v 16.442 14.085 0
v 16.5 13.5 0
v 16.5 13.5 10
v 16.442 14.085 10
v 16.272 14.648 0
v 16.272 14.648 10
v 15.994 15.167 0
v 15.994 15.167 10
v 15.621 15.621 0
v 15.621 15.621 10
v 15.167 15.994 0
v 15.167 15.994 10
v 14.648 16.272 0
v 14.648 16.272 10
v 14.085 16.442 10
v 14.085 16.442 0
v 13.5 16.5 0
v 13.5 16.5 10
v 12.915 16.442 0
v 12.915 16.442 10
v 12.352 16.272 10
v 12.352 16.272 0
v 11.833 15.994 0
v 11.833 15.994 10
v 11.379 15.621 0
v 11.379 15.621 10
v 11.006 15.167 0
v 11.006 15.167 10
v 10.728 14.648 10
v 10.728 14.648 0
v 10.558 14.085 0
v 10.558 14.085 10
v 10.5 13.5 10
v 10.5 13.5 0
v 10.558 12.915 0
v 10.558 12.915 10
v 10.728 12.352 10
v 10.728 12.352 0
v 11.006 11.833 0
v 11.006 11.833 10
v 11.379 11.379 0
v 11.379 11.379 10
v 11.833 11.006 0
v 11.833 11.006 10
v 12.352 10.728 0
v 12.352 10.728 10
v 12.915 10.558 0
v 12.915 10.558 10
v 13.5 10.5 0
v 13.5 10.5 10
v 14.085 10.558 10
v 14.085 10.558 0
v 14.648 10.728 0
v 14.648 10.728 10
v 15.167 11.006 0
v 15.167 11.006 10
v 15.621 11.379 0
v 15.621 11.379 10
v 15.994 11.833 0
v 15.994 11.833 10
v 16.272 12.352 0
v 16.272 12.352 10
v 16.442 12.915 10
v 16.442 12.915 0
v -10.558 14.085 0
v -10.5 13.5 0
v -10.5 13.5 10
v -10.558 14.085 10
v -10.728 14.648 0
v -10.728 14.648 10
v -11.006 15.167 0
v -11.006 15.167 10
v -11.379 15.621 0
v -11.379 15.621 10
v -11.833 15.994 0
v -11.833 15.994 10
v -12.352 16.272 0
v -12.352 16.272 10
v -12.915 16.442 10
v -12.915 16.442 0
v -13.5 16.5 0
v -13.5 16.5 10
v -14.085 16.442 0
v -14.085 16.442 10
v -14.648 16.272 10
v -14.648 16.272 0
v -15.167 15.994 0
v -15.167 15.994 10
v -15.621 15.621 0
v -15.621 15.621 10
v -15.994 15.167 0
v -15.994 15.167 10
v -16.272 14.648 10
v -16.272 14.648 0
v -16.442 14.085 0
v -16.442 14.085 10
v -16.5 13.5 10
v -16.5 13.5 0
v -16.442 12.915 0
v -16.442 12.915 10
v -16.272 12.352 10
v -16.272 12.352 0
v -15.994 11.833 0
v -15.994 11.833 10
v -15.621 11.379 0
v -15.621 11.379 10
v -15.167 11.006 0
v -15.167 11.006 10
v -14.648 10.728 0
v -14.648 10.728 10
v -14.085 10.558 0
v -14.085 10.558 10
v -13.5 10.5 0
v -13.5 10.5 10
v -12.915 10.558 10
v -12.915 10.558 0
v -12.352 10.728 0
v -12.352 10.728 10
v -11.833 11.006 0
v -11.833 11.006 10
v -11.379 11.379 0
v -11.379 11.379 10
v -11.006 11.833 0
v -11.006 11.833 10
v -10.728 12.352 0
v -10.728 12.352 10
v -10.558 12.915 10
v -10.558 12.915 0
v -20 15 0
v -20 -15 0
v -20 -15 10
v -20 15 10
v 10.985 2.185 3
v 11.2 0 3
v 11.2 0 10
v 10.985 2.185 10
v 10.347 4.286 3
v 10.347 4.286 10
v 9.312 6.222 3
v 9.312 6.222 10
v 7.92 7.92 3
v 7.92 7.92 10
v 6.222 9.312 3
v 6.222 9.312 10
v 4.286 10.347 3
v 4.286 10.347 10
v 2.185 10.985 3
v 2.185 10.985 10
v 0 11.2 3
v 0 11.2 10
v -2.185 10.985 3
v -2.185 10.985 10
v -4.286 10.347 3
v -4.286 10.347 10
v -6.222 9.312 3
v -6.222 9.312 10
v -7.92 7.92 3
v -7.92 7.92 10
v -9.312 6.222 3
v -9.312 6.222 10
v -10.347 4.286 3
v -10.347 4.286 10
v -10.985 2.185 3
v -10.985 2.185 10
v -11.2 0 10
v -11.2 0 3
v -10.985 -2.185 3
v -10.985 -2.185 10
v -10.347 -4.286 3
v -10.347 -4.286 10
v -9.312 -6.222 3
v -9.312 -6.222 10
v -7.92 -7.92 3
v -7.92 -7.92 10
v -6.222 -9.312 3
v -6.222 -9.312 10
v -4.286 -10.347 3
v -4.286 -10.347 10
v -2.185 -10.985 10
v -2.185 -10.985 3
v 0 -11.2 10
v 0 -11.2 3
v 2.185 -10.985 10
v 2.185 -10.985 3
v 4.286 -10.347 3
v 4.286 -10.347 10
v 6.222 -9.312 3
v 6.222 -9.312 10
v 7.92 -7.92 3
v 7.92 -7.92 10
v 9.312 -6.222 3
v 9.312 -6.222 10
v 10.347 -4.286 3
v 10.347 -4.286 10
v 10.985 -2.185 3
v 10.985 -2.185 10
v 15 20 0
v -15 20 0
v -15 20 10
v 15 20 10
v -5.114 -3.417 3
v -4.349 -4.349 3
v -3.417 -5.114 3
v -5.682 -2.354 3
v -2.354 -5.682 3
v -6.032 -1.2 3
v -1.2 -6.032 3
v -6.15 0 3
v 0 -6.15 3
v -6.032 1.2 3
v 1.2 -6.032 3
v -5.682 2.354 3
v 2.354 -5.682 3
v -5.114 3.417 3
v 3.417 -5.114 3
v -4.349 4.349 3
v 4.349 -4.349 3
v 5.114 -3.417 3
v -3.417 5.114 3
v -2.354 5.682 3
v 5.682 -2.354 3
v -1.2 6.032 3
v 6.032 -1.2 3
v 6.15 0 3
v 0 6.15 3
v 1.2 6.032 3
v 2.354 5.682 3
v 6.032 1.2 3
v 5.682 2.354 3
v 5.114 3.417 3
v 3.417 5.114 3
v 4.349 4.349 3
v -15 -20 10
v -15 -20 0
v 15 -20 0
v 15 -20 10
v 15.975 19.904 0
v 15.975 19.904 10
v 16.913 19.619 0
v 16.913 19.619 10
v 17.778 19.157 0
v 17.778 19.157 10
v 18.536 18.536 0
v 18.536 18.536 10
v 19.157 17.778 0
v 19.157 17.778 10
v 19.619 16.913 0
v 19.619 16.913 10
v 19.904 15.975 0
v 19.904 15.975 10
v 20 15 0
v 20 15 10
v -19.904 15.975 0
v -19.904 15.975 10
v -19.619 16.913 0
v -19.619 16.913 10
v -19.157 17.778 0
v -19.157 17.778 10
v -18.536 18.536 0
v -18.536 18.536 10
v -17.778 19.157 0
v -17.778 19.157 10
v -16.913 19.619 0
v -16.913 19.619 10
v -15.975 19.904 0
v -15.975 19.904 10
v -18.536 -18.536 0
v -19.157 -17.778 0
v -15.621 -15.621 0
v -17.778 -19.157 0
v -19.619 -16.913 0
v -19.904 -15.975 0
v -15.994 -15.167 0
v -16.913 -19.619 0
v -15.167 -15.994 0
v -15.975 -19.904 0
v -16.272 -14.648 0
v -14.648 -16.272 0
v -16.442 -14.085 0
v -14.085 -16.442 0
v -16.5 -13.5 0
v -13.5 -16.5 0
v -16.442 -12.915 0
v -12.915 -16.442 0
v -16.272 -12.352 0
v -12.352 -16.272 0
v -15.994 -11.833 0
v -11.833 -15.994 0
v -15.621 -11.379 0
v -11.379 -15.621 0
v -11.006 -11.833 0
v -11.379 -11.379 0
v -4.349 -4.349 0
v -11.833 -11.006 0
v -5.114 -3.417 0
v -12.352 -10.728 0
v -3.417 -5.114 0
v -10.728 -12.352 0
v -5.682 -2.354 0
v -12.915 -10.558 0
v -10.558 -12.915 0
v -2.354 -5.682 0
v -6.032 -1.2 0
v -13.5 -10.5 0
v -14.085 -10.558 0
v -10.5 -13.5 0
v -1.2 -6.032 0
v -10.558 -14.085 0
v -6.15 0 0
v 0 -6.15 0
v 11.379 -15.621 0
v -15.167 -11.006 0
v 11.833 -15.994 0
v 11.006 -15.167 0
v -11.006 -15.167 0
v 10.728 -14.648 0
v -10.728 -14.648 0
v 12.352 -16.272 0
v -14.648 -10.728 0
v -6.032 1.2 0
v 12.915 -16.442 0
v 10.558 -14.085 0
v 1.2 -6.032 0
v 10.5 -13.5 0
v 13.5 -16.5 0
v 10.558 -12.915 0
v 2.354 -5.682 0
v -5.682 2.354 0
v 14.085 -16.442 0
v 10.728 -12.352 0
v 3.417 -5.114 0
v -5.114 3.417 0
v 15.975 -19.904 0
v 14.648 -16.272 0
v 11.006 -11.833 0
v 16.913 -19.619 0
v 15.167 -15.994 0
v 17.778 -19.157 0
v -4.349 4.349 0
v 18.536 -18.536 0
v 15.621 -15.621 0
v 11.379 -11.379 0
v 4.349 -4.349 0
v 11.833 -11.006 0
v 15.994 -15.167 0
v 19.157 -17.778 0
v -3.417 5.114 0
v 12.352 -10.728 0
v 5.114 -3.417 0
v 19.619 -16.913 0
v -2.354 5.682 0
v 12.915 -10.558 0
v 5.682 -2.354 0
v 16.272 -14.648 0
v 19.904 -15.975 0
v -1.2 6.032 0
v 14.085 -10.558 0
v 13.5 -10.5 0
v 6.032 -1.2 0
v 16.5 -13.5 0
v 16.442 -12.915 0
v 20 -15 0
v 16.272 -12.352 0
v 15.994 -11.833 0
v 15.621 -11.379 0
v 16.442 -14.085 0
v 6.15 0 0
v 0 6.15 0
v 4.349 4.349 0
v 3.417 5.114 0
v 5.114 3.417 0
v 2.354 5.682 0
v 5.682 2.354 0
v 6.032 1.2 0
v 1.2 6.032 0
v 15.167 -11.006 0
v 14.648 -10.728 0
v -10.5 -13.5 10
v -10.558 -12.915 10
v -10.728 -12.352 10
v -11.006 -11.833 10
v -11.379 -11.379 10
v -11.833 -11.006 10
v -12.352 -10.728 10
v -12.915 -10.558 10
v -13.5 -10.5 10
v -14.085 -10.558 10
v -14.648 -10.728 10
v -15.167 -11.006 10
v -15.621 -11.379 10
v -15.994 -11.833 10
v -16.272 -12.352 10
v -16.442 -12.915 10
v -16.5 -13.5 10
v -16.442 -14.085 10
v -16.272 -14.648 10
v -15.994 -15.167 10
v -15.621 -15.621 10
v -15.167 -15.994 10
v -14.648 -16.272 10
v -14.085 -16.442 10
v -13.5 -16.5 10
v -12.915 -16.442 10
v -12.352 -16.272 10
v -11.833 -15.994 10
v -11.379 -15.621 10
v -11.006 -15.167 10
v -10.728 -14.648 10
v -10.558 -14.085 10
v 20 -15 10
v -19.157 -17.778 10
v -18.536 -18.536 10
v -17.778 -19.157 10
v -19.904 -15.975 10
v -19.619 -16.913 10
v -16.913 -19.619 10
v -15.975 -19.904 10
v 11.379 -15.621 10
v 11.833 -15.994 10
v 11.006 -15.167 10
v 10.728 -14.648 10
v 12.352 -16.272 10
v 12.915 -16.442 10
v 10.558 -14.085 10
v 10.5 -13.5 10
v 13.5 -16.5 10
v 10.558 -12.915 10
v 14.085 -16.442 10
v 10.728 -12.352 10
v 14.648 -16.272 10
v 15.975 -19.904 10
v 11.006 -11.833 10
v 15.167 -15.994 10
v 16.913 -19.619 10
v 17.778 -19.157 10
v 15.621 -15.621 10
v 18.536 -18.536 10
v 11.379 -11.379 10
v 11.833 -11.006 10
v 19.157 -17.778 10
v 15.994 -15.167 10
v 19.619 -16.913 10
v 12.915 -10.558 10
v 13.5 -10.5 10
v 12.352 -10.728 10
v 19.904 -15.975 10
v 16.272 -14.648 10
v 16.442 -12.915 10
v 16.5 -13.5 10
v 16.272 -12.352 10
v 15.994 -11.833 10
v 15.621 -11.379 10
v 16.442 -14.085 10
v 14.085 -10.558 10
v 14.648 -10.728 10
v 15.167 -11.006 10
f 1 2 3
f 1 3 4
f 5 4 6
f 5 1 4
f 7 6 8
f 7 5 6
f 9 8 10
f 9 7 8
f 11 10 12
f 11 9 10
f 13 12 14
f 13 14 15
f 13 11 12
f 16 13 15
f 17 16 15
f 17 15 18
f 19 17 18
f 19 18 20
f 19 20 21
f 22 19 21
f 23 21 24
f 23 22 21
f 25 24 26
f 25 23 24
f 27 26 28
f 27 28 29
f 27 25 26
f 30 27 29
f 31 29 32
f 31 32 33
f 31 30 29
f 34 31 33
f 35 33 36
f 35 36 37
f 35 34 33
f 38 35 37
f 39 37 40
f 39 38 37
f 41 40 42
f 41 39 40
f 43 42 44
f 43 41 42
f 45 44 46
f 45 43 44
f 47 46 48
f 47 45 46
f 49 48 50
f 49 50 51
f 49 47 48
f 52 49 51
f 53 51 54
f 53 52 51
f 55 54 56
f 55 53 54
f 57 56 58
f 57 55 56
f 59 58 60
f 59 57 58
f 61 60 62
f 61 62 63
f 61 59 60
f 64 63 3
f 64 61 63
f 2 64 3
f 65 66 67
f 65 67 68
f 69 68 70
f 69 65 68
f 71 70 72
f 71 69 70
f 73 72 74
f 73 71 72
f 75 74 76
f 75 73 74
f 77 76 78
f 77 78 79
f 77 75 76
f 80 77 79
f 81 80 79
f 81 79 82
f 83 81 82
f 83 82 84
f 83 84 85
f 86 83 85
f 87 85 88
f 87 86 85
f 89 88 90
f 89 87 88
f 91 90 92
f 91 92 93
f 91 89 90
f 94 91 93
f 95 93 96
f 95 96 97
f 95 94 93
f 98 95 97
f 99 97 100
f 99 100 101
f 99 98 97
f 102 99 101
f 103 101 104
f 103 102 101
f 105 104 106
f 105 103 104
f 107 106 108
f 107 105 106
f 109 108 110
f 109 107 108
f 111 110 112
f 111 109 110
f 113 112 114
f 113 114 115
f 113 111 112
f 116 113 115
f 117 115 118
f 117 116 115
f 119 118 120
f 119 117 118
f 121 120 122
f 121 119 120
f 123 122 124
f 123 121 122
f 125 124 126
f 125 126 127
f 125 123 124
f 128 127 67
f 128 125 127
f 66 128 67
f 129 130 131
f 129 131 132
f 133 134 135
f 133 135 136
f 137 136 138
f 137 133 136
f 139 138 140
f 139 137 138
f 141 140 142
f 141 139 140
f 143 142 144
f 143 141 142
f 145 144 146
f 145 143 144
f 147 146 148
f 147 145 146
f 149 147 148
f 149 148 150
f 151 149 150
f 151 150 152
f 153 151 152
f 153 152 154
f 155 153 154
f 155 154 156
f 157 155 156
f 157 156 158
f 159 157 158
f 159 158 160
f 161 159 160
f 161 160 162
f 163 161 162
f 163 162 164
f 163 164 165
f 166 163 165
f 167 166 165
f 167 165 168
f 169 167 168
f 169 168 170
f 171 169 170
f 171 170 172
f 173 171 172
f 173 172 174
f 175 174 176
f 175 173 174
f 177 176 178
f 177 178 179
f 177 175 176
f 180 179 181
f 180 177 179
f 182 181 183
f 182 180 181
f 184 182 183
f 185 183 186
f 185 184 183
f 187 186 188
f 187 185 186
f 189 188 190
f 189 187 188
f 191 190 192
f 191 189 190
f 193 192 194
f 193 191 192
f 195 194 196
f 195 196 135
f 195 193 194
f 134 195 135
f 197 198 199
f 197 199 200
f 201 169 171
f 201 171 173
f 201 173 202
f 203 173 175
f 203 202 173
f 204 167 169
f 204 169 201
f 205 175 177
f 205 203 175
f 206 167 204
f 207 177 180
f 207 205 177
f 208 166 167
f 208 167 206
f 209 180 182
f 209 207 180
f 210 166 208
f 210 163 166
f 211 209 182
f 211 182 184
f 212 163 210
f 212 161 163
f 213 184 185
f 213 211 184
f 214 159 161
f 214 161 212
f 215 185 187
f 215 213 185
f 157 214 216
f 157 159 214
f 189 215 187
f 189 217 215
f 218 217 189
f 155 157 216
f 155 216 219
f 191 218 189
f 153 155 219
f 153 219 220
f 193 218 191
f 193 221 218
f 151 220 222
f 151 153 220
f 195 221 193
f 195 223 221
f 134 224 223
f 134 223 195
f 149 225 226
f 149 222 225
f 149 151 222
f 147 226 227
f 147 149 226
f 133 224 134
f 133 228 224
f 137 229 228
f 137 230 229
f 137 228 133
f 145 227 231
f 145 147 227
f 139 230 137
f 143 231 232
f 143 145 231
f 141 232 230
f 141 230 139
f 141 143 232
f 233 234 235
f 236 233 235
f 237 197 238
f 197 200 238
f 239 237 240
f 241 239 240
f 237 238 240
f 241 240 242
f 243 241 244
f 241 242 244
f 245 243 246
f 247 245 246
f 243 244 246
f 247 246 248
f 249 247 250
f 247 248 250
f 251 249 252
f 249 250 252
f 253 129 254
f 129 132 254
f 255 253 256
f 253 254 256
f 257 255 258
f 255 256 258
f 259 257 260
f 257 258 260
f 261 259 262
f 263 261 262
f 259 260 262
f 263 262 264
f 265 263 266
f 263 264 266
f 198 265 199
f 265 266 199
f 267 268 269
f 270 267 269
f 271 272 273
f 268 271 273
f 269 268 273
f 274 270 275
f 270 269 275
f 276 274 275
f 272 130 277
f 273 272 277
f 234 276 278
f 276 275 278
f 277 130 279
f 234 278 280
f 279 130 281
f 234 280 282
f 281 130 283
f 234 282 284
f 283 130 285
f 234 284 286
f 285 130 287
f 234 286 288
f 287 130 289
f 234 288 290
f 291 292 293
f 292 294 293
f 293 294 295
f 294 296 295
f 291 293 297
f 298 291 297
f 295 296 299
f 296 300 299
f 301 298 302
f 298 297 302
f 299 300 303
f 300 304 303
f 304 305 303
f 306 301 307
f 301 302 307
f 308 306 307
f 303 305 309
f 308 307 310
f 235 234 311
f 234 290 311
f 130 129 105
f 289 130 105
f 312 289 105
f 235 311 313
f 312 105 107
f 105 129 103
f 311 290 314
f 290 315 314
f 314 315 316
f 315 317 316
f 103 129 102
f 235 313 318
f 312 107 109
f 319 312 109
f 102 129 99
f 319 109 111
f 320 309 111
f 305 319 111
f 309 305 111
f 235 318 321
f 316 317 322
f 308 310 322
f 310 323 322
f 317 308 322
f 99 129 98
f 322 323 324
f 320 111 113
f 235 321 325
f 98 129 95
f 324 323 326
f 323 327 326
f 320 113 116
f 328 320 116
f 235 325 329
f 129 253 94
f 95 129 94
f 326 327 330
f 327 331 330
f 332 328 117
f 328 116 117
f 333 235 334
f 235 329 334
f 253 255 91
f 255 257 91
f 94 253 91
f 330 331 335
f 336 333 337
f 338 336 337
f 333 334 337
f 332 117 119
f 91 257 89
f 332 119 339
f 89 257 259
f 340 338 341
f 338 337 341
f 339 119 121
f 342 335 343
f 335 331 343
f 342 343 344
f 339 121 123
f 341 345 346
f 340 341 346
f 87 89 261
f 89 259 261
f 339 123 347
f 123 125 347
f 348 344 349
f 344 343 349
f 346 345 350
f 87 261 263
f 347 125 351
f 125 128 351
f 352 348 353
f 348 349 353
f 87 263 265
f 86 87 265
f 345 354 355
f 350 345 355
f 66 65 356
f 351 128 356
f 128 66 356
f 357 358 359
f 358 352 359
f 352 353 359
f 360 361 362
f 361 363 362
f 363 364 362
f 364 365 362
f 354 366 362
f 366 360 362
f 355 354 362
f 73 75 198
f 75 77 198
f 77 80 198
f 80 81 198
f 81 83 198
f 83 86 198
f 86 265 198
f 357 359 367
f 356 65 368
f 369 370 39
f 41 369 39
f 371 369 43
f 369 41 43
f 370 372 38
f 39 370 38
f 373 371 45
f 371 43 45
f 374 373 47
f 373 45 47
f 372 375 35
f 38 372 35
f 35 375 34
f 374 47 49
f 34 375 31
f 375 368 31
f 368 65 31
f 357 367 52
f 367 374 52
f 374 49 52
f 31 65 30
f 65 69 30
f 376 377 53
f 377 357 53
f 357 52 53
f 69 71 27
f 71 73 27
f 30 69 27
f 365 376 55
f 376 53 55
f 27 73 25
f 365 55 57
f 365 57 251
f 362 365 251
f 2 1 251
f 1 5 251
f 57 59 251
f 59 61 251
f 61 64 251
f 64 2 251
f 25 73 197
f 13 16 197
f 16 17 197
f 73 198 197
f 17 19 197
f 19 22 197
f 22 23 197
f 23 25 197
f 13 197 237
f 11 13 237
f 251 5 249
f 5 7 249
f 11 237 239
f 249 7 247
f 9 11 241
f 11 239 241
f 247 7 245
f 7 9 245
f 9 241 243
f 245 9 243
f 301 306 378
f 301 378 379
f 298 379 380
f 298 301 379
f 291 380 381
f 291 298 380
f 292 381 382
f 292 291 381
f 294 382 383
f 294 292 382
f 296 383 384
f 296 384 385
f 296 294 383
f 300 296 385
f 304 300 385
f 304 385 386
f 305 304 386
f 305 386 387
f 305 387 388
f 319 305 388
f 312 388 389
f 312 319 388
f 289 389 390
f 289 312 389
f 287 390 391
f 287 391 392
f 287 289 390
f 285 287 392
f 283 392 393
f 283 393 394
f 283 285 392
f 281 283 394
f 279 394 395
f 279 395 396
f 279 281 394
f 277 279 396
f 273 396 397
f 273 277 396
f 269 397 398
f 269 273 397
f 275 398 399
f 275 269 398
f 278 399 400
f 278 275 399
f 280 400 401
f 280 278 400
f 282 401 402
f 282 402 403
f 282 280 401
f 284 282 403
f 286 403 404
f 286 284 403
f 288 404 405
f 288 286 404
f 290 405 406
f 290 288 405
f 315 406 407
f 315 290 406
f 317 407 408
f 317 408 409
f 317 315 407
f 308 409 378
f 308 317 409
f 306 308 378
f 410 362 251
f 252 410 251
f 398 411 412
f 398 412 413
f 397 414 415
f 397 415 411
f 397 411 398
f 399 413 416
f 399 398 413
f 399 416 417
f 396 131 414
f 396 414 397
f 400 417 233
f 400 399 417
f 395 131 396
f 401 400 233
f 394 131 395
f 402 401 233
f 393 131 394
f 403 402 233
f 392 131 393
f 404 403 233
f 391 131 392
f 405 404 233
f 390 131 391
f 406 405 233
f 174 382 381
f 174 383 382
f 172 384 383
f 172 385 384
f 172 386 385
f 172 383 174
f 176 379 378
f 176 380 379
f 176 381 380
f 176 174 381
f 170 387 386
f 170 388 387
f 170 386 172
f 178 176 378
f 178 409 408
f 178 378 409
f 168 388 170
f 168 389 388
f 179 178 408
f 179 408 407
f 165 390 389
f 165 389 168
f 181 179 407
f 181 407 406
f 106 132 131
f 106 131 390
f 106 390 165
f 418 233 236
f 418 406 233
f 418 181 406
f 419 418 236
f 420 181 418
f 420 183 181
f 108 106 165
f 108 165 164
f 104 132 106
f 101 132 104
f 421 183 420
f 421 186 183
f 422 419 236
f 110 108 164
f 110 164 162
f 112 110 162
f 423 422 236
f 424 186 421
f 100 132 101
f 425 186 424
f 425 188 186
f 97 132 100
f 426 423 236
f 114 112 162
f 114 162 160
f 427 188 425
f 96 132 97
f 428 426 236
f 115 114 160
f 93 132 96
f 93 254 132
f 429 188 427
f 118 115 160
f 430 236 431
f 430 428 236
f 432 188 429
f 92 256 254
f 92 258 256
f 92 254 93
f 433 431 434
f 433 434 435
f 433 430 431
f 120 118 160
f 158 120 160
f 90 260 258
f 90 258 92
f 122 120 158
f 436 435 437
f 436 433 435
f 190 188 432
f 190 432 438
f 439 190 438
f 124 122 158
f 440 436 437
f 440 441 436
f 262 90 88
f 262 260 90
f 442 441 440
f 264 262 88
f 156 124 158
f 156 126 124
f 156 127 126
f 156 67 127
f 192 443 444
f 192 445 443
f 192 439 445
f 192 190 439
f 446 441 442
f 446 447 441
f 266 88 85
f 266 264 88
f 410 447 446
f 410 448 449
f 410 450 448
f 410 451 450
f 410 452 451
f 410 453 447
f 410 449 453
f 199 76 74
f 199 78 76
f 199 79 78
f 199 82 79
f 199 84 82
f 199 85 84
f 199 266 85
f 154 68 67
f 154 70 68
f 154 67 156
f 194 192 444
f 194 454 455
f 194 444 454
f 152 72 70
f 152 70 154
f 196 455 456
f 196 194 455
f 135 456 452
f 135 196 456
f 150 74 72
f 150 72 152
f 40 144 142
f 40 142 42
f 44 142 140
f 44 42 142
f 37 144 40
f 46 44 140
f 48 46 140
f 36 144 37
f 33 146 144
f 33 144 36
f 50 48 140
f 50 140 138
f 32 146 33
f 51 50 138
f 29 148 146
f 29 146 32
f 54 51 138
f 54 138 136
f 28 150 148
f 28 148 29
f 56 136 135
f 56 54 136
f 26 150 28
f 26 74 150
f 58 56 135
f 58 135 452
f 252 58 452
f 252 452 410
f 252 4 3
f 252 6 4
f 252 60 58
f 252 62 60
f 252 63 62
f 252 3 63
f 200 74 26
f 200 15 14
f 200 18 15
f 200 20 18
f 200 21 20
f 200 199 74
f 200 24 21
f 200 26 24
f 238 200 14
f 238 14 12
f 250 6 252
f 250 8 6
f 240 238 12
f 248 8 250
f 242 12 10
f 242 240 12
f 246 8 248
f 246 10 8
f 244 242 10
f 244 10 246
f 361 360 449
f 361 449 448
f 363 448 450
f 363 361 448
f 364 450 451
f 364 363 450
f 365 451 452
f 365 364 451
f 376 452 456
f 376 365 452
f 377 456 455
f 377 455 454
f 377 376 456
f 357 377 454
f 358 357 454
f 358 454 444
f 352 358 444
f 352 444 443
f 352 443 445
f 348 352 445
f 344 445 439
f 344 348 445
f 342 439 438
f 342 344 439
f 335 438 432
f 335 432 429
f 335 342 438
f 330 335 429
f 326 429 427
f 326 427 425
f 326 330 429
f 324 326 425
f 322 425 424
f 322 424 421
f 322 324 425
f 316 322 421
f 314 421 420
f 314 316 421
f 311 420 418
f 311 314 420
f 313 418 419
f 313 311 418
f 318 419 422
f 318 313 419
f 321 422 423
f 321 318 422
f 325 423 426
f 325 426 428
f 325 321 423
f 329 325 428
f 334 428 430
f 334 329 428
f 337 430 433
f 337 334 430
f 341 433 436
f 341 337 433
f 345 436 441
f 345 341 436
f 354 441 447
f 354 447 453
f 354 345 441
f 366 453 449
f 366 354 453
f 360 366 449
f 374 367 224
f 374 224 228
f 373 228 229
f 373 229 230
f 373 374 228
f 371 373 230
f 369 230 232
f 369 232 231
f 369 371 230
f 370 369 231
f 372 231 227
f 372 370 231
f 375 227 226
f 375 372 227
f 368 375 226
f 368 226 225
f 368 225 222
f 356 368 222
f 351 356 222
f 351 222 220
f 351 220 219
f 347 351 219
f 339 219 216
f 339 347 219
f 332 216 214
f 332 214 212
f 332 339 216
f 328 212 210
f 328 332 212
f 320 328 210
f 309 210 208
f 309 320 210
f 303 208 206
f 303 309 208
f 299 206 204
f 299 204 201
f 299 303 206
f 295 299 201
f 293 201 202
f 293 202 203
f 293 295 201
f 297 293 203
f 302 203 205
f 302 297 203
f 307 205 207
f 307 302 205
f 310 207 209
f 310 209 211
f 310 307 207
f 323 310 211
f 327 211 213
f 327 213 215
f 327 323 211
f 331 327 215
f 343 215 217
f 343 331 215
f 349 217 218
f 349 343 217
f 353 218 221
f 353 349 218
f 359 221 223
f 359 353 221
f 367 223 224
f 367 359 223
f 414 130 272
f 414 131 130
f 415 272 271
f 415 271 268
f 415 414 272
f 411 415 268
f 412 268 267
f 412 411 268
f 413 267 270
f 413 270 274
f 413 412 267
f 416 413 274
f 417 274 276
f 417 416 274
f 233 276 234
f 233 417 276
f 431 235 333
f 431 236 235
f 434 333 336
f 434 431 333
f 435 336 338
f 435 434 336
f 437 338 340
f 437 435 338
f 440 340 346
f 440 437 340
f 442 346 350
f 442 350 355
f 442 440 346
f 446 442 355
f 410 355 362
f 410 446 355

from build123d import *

# Parameters (mm, degrees)
F0_W     = 40
F0_H     = 40
F0_R     = 3
F0_R_2   = 11.2
F1_DEPTH = 10
F0_R_3   = 6.15
F2_DEPTH = 3
F3_R     = 5


with BuildPart() as f1:
    # F0 (on Top) → F1 (new body)
    with BuildSketch(Plane.XY):
        Rectangle(F0_W, F0_H)
        with Locations((-13.5, -13.5)):
            Circle(F0_R, mode=Mode.SUBTRACT)
        with Locations((13.5, -13.5)):
            Circle(F0_R, mode=Mode.SUBTRACT)
        with Locations((-13.5, 13.5)):
            Circle(F0_R, mode=Mode.SUBTRACT)
        Circle(F0_R_2, mode=Mode.SUBTRACT)
        with Locations((13.5, 13.5)):
            Circle(F0_R, mode=Mode.SUBTRACT)
    extrude(amount=F1_DEPTH)

    # F0 (on Top) → F2 (join)
    with BuildSketch(Plane.XY):
        Circle(F0_R_2)
        Circle(F0_R_3, mode=Mode.SUBTRACT)
    extrude(amount=F2_DEPTH)

    # F3
    f3_edges = [f1.edges().sort_by_distance(p)[0] for p in [
        (-20, -20, 5),
        (20, -20, 5),
        (20, 20, 5),
        (-20, 20, 5),
    ]]
    fillet(f3_edges, radius=F3_R)


solid = f1.part
